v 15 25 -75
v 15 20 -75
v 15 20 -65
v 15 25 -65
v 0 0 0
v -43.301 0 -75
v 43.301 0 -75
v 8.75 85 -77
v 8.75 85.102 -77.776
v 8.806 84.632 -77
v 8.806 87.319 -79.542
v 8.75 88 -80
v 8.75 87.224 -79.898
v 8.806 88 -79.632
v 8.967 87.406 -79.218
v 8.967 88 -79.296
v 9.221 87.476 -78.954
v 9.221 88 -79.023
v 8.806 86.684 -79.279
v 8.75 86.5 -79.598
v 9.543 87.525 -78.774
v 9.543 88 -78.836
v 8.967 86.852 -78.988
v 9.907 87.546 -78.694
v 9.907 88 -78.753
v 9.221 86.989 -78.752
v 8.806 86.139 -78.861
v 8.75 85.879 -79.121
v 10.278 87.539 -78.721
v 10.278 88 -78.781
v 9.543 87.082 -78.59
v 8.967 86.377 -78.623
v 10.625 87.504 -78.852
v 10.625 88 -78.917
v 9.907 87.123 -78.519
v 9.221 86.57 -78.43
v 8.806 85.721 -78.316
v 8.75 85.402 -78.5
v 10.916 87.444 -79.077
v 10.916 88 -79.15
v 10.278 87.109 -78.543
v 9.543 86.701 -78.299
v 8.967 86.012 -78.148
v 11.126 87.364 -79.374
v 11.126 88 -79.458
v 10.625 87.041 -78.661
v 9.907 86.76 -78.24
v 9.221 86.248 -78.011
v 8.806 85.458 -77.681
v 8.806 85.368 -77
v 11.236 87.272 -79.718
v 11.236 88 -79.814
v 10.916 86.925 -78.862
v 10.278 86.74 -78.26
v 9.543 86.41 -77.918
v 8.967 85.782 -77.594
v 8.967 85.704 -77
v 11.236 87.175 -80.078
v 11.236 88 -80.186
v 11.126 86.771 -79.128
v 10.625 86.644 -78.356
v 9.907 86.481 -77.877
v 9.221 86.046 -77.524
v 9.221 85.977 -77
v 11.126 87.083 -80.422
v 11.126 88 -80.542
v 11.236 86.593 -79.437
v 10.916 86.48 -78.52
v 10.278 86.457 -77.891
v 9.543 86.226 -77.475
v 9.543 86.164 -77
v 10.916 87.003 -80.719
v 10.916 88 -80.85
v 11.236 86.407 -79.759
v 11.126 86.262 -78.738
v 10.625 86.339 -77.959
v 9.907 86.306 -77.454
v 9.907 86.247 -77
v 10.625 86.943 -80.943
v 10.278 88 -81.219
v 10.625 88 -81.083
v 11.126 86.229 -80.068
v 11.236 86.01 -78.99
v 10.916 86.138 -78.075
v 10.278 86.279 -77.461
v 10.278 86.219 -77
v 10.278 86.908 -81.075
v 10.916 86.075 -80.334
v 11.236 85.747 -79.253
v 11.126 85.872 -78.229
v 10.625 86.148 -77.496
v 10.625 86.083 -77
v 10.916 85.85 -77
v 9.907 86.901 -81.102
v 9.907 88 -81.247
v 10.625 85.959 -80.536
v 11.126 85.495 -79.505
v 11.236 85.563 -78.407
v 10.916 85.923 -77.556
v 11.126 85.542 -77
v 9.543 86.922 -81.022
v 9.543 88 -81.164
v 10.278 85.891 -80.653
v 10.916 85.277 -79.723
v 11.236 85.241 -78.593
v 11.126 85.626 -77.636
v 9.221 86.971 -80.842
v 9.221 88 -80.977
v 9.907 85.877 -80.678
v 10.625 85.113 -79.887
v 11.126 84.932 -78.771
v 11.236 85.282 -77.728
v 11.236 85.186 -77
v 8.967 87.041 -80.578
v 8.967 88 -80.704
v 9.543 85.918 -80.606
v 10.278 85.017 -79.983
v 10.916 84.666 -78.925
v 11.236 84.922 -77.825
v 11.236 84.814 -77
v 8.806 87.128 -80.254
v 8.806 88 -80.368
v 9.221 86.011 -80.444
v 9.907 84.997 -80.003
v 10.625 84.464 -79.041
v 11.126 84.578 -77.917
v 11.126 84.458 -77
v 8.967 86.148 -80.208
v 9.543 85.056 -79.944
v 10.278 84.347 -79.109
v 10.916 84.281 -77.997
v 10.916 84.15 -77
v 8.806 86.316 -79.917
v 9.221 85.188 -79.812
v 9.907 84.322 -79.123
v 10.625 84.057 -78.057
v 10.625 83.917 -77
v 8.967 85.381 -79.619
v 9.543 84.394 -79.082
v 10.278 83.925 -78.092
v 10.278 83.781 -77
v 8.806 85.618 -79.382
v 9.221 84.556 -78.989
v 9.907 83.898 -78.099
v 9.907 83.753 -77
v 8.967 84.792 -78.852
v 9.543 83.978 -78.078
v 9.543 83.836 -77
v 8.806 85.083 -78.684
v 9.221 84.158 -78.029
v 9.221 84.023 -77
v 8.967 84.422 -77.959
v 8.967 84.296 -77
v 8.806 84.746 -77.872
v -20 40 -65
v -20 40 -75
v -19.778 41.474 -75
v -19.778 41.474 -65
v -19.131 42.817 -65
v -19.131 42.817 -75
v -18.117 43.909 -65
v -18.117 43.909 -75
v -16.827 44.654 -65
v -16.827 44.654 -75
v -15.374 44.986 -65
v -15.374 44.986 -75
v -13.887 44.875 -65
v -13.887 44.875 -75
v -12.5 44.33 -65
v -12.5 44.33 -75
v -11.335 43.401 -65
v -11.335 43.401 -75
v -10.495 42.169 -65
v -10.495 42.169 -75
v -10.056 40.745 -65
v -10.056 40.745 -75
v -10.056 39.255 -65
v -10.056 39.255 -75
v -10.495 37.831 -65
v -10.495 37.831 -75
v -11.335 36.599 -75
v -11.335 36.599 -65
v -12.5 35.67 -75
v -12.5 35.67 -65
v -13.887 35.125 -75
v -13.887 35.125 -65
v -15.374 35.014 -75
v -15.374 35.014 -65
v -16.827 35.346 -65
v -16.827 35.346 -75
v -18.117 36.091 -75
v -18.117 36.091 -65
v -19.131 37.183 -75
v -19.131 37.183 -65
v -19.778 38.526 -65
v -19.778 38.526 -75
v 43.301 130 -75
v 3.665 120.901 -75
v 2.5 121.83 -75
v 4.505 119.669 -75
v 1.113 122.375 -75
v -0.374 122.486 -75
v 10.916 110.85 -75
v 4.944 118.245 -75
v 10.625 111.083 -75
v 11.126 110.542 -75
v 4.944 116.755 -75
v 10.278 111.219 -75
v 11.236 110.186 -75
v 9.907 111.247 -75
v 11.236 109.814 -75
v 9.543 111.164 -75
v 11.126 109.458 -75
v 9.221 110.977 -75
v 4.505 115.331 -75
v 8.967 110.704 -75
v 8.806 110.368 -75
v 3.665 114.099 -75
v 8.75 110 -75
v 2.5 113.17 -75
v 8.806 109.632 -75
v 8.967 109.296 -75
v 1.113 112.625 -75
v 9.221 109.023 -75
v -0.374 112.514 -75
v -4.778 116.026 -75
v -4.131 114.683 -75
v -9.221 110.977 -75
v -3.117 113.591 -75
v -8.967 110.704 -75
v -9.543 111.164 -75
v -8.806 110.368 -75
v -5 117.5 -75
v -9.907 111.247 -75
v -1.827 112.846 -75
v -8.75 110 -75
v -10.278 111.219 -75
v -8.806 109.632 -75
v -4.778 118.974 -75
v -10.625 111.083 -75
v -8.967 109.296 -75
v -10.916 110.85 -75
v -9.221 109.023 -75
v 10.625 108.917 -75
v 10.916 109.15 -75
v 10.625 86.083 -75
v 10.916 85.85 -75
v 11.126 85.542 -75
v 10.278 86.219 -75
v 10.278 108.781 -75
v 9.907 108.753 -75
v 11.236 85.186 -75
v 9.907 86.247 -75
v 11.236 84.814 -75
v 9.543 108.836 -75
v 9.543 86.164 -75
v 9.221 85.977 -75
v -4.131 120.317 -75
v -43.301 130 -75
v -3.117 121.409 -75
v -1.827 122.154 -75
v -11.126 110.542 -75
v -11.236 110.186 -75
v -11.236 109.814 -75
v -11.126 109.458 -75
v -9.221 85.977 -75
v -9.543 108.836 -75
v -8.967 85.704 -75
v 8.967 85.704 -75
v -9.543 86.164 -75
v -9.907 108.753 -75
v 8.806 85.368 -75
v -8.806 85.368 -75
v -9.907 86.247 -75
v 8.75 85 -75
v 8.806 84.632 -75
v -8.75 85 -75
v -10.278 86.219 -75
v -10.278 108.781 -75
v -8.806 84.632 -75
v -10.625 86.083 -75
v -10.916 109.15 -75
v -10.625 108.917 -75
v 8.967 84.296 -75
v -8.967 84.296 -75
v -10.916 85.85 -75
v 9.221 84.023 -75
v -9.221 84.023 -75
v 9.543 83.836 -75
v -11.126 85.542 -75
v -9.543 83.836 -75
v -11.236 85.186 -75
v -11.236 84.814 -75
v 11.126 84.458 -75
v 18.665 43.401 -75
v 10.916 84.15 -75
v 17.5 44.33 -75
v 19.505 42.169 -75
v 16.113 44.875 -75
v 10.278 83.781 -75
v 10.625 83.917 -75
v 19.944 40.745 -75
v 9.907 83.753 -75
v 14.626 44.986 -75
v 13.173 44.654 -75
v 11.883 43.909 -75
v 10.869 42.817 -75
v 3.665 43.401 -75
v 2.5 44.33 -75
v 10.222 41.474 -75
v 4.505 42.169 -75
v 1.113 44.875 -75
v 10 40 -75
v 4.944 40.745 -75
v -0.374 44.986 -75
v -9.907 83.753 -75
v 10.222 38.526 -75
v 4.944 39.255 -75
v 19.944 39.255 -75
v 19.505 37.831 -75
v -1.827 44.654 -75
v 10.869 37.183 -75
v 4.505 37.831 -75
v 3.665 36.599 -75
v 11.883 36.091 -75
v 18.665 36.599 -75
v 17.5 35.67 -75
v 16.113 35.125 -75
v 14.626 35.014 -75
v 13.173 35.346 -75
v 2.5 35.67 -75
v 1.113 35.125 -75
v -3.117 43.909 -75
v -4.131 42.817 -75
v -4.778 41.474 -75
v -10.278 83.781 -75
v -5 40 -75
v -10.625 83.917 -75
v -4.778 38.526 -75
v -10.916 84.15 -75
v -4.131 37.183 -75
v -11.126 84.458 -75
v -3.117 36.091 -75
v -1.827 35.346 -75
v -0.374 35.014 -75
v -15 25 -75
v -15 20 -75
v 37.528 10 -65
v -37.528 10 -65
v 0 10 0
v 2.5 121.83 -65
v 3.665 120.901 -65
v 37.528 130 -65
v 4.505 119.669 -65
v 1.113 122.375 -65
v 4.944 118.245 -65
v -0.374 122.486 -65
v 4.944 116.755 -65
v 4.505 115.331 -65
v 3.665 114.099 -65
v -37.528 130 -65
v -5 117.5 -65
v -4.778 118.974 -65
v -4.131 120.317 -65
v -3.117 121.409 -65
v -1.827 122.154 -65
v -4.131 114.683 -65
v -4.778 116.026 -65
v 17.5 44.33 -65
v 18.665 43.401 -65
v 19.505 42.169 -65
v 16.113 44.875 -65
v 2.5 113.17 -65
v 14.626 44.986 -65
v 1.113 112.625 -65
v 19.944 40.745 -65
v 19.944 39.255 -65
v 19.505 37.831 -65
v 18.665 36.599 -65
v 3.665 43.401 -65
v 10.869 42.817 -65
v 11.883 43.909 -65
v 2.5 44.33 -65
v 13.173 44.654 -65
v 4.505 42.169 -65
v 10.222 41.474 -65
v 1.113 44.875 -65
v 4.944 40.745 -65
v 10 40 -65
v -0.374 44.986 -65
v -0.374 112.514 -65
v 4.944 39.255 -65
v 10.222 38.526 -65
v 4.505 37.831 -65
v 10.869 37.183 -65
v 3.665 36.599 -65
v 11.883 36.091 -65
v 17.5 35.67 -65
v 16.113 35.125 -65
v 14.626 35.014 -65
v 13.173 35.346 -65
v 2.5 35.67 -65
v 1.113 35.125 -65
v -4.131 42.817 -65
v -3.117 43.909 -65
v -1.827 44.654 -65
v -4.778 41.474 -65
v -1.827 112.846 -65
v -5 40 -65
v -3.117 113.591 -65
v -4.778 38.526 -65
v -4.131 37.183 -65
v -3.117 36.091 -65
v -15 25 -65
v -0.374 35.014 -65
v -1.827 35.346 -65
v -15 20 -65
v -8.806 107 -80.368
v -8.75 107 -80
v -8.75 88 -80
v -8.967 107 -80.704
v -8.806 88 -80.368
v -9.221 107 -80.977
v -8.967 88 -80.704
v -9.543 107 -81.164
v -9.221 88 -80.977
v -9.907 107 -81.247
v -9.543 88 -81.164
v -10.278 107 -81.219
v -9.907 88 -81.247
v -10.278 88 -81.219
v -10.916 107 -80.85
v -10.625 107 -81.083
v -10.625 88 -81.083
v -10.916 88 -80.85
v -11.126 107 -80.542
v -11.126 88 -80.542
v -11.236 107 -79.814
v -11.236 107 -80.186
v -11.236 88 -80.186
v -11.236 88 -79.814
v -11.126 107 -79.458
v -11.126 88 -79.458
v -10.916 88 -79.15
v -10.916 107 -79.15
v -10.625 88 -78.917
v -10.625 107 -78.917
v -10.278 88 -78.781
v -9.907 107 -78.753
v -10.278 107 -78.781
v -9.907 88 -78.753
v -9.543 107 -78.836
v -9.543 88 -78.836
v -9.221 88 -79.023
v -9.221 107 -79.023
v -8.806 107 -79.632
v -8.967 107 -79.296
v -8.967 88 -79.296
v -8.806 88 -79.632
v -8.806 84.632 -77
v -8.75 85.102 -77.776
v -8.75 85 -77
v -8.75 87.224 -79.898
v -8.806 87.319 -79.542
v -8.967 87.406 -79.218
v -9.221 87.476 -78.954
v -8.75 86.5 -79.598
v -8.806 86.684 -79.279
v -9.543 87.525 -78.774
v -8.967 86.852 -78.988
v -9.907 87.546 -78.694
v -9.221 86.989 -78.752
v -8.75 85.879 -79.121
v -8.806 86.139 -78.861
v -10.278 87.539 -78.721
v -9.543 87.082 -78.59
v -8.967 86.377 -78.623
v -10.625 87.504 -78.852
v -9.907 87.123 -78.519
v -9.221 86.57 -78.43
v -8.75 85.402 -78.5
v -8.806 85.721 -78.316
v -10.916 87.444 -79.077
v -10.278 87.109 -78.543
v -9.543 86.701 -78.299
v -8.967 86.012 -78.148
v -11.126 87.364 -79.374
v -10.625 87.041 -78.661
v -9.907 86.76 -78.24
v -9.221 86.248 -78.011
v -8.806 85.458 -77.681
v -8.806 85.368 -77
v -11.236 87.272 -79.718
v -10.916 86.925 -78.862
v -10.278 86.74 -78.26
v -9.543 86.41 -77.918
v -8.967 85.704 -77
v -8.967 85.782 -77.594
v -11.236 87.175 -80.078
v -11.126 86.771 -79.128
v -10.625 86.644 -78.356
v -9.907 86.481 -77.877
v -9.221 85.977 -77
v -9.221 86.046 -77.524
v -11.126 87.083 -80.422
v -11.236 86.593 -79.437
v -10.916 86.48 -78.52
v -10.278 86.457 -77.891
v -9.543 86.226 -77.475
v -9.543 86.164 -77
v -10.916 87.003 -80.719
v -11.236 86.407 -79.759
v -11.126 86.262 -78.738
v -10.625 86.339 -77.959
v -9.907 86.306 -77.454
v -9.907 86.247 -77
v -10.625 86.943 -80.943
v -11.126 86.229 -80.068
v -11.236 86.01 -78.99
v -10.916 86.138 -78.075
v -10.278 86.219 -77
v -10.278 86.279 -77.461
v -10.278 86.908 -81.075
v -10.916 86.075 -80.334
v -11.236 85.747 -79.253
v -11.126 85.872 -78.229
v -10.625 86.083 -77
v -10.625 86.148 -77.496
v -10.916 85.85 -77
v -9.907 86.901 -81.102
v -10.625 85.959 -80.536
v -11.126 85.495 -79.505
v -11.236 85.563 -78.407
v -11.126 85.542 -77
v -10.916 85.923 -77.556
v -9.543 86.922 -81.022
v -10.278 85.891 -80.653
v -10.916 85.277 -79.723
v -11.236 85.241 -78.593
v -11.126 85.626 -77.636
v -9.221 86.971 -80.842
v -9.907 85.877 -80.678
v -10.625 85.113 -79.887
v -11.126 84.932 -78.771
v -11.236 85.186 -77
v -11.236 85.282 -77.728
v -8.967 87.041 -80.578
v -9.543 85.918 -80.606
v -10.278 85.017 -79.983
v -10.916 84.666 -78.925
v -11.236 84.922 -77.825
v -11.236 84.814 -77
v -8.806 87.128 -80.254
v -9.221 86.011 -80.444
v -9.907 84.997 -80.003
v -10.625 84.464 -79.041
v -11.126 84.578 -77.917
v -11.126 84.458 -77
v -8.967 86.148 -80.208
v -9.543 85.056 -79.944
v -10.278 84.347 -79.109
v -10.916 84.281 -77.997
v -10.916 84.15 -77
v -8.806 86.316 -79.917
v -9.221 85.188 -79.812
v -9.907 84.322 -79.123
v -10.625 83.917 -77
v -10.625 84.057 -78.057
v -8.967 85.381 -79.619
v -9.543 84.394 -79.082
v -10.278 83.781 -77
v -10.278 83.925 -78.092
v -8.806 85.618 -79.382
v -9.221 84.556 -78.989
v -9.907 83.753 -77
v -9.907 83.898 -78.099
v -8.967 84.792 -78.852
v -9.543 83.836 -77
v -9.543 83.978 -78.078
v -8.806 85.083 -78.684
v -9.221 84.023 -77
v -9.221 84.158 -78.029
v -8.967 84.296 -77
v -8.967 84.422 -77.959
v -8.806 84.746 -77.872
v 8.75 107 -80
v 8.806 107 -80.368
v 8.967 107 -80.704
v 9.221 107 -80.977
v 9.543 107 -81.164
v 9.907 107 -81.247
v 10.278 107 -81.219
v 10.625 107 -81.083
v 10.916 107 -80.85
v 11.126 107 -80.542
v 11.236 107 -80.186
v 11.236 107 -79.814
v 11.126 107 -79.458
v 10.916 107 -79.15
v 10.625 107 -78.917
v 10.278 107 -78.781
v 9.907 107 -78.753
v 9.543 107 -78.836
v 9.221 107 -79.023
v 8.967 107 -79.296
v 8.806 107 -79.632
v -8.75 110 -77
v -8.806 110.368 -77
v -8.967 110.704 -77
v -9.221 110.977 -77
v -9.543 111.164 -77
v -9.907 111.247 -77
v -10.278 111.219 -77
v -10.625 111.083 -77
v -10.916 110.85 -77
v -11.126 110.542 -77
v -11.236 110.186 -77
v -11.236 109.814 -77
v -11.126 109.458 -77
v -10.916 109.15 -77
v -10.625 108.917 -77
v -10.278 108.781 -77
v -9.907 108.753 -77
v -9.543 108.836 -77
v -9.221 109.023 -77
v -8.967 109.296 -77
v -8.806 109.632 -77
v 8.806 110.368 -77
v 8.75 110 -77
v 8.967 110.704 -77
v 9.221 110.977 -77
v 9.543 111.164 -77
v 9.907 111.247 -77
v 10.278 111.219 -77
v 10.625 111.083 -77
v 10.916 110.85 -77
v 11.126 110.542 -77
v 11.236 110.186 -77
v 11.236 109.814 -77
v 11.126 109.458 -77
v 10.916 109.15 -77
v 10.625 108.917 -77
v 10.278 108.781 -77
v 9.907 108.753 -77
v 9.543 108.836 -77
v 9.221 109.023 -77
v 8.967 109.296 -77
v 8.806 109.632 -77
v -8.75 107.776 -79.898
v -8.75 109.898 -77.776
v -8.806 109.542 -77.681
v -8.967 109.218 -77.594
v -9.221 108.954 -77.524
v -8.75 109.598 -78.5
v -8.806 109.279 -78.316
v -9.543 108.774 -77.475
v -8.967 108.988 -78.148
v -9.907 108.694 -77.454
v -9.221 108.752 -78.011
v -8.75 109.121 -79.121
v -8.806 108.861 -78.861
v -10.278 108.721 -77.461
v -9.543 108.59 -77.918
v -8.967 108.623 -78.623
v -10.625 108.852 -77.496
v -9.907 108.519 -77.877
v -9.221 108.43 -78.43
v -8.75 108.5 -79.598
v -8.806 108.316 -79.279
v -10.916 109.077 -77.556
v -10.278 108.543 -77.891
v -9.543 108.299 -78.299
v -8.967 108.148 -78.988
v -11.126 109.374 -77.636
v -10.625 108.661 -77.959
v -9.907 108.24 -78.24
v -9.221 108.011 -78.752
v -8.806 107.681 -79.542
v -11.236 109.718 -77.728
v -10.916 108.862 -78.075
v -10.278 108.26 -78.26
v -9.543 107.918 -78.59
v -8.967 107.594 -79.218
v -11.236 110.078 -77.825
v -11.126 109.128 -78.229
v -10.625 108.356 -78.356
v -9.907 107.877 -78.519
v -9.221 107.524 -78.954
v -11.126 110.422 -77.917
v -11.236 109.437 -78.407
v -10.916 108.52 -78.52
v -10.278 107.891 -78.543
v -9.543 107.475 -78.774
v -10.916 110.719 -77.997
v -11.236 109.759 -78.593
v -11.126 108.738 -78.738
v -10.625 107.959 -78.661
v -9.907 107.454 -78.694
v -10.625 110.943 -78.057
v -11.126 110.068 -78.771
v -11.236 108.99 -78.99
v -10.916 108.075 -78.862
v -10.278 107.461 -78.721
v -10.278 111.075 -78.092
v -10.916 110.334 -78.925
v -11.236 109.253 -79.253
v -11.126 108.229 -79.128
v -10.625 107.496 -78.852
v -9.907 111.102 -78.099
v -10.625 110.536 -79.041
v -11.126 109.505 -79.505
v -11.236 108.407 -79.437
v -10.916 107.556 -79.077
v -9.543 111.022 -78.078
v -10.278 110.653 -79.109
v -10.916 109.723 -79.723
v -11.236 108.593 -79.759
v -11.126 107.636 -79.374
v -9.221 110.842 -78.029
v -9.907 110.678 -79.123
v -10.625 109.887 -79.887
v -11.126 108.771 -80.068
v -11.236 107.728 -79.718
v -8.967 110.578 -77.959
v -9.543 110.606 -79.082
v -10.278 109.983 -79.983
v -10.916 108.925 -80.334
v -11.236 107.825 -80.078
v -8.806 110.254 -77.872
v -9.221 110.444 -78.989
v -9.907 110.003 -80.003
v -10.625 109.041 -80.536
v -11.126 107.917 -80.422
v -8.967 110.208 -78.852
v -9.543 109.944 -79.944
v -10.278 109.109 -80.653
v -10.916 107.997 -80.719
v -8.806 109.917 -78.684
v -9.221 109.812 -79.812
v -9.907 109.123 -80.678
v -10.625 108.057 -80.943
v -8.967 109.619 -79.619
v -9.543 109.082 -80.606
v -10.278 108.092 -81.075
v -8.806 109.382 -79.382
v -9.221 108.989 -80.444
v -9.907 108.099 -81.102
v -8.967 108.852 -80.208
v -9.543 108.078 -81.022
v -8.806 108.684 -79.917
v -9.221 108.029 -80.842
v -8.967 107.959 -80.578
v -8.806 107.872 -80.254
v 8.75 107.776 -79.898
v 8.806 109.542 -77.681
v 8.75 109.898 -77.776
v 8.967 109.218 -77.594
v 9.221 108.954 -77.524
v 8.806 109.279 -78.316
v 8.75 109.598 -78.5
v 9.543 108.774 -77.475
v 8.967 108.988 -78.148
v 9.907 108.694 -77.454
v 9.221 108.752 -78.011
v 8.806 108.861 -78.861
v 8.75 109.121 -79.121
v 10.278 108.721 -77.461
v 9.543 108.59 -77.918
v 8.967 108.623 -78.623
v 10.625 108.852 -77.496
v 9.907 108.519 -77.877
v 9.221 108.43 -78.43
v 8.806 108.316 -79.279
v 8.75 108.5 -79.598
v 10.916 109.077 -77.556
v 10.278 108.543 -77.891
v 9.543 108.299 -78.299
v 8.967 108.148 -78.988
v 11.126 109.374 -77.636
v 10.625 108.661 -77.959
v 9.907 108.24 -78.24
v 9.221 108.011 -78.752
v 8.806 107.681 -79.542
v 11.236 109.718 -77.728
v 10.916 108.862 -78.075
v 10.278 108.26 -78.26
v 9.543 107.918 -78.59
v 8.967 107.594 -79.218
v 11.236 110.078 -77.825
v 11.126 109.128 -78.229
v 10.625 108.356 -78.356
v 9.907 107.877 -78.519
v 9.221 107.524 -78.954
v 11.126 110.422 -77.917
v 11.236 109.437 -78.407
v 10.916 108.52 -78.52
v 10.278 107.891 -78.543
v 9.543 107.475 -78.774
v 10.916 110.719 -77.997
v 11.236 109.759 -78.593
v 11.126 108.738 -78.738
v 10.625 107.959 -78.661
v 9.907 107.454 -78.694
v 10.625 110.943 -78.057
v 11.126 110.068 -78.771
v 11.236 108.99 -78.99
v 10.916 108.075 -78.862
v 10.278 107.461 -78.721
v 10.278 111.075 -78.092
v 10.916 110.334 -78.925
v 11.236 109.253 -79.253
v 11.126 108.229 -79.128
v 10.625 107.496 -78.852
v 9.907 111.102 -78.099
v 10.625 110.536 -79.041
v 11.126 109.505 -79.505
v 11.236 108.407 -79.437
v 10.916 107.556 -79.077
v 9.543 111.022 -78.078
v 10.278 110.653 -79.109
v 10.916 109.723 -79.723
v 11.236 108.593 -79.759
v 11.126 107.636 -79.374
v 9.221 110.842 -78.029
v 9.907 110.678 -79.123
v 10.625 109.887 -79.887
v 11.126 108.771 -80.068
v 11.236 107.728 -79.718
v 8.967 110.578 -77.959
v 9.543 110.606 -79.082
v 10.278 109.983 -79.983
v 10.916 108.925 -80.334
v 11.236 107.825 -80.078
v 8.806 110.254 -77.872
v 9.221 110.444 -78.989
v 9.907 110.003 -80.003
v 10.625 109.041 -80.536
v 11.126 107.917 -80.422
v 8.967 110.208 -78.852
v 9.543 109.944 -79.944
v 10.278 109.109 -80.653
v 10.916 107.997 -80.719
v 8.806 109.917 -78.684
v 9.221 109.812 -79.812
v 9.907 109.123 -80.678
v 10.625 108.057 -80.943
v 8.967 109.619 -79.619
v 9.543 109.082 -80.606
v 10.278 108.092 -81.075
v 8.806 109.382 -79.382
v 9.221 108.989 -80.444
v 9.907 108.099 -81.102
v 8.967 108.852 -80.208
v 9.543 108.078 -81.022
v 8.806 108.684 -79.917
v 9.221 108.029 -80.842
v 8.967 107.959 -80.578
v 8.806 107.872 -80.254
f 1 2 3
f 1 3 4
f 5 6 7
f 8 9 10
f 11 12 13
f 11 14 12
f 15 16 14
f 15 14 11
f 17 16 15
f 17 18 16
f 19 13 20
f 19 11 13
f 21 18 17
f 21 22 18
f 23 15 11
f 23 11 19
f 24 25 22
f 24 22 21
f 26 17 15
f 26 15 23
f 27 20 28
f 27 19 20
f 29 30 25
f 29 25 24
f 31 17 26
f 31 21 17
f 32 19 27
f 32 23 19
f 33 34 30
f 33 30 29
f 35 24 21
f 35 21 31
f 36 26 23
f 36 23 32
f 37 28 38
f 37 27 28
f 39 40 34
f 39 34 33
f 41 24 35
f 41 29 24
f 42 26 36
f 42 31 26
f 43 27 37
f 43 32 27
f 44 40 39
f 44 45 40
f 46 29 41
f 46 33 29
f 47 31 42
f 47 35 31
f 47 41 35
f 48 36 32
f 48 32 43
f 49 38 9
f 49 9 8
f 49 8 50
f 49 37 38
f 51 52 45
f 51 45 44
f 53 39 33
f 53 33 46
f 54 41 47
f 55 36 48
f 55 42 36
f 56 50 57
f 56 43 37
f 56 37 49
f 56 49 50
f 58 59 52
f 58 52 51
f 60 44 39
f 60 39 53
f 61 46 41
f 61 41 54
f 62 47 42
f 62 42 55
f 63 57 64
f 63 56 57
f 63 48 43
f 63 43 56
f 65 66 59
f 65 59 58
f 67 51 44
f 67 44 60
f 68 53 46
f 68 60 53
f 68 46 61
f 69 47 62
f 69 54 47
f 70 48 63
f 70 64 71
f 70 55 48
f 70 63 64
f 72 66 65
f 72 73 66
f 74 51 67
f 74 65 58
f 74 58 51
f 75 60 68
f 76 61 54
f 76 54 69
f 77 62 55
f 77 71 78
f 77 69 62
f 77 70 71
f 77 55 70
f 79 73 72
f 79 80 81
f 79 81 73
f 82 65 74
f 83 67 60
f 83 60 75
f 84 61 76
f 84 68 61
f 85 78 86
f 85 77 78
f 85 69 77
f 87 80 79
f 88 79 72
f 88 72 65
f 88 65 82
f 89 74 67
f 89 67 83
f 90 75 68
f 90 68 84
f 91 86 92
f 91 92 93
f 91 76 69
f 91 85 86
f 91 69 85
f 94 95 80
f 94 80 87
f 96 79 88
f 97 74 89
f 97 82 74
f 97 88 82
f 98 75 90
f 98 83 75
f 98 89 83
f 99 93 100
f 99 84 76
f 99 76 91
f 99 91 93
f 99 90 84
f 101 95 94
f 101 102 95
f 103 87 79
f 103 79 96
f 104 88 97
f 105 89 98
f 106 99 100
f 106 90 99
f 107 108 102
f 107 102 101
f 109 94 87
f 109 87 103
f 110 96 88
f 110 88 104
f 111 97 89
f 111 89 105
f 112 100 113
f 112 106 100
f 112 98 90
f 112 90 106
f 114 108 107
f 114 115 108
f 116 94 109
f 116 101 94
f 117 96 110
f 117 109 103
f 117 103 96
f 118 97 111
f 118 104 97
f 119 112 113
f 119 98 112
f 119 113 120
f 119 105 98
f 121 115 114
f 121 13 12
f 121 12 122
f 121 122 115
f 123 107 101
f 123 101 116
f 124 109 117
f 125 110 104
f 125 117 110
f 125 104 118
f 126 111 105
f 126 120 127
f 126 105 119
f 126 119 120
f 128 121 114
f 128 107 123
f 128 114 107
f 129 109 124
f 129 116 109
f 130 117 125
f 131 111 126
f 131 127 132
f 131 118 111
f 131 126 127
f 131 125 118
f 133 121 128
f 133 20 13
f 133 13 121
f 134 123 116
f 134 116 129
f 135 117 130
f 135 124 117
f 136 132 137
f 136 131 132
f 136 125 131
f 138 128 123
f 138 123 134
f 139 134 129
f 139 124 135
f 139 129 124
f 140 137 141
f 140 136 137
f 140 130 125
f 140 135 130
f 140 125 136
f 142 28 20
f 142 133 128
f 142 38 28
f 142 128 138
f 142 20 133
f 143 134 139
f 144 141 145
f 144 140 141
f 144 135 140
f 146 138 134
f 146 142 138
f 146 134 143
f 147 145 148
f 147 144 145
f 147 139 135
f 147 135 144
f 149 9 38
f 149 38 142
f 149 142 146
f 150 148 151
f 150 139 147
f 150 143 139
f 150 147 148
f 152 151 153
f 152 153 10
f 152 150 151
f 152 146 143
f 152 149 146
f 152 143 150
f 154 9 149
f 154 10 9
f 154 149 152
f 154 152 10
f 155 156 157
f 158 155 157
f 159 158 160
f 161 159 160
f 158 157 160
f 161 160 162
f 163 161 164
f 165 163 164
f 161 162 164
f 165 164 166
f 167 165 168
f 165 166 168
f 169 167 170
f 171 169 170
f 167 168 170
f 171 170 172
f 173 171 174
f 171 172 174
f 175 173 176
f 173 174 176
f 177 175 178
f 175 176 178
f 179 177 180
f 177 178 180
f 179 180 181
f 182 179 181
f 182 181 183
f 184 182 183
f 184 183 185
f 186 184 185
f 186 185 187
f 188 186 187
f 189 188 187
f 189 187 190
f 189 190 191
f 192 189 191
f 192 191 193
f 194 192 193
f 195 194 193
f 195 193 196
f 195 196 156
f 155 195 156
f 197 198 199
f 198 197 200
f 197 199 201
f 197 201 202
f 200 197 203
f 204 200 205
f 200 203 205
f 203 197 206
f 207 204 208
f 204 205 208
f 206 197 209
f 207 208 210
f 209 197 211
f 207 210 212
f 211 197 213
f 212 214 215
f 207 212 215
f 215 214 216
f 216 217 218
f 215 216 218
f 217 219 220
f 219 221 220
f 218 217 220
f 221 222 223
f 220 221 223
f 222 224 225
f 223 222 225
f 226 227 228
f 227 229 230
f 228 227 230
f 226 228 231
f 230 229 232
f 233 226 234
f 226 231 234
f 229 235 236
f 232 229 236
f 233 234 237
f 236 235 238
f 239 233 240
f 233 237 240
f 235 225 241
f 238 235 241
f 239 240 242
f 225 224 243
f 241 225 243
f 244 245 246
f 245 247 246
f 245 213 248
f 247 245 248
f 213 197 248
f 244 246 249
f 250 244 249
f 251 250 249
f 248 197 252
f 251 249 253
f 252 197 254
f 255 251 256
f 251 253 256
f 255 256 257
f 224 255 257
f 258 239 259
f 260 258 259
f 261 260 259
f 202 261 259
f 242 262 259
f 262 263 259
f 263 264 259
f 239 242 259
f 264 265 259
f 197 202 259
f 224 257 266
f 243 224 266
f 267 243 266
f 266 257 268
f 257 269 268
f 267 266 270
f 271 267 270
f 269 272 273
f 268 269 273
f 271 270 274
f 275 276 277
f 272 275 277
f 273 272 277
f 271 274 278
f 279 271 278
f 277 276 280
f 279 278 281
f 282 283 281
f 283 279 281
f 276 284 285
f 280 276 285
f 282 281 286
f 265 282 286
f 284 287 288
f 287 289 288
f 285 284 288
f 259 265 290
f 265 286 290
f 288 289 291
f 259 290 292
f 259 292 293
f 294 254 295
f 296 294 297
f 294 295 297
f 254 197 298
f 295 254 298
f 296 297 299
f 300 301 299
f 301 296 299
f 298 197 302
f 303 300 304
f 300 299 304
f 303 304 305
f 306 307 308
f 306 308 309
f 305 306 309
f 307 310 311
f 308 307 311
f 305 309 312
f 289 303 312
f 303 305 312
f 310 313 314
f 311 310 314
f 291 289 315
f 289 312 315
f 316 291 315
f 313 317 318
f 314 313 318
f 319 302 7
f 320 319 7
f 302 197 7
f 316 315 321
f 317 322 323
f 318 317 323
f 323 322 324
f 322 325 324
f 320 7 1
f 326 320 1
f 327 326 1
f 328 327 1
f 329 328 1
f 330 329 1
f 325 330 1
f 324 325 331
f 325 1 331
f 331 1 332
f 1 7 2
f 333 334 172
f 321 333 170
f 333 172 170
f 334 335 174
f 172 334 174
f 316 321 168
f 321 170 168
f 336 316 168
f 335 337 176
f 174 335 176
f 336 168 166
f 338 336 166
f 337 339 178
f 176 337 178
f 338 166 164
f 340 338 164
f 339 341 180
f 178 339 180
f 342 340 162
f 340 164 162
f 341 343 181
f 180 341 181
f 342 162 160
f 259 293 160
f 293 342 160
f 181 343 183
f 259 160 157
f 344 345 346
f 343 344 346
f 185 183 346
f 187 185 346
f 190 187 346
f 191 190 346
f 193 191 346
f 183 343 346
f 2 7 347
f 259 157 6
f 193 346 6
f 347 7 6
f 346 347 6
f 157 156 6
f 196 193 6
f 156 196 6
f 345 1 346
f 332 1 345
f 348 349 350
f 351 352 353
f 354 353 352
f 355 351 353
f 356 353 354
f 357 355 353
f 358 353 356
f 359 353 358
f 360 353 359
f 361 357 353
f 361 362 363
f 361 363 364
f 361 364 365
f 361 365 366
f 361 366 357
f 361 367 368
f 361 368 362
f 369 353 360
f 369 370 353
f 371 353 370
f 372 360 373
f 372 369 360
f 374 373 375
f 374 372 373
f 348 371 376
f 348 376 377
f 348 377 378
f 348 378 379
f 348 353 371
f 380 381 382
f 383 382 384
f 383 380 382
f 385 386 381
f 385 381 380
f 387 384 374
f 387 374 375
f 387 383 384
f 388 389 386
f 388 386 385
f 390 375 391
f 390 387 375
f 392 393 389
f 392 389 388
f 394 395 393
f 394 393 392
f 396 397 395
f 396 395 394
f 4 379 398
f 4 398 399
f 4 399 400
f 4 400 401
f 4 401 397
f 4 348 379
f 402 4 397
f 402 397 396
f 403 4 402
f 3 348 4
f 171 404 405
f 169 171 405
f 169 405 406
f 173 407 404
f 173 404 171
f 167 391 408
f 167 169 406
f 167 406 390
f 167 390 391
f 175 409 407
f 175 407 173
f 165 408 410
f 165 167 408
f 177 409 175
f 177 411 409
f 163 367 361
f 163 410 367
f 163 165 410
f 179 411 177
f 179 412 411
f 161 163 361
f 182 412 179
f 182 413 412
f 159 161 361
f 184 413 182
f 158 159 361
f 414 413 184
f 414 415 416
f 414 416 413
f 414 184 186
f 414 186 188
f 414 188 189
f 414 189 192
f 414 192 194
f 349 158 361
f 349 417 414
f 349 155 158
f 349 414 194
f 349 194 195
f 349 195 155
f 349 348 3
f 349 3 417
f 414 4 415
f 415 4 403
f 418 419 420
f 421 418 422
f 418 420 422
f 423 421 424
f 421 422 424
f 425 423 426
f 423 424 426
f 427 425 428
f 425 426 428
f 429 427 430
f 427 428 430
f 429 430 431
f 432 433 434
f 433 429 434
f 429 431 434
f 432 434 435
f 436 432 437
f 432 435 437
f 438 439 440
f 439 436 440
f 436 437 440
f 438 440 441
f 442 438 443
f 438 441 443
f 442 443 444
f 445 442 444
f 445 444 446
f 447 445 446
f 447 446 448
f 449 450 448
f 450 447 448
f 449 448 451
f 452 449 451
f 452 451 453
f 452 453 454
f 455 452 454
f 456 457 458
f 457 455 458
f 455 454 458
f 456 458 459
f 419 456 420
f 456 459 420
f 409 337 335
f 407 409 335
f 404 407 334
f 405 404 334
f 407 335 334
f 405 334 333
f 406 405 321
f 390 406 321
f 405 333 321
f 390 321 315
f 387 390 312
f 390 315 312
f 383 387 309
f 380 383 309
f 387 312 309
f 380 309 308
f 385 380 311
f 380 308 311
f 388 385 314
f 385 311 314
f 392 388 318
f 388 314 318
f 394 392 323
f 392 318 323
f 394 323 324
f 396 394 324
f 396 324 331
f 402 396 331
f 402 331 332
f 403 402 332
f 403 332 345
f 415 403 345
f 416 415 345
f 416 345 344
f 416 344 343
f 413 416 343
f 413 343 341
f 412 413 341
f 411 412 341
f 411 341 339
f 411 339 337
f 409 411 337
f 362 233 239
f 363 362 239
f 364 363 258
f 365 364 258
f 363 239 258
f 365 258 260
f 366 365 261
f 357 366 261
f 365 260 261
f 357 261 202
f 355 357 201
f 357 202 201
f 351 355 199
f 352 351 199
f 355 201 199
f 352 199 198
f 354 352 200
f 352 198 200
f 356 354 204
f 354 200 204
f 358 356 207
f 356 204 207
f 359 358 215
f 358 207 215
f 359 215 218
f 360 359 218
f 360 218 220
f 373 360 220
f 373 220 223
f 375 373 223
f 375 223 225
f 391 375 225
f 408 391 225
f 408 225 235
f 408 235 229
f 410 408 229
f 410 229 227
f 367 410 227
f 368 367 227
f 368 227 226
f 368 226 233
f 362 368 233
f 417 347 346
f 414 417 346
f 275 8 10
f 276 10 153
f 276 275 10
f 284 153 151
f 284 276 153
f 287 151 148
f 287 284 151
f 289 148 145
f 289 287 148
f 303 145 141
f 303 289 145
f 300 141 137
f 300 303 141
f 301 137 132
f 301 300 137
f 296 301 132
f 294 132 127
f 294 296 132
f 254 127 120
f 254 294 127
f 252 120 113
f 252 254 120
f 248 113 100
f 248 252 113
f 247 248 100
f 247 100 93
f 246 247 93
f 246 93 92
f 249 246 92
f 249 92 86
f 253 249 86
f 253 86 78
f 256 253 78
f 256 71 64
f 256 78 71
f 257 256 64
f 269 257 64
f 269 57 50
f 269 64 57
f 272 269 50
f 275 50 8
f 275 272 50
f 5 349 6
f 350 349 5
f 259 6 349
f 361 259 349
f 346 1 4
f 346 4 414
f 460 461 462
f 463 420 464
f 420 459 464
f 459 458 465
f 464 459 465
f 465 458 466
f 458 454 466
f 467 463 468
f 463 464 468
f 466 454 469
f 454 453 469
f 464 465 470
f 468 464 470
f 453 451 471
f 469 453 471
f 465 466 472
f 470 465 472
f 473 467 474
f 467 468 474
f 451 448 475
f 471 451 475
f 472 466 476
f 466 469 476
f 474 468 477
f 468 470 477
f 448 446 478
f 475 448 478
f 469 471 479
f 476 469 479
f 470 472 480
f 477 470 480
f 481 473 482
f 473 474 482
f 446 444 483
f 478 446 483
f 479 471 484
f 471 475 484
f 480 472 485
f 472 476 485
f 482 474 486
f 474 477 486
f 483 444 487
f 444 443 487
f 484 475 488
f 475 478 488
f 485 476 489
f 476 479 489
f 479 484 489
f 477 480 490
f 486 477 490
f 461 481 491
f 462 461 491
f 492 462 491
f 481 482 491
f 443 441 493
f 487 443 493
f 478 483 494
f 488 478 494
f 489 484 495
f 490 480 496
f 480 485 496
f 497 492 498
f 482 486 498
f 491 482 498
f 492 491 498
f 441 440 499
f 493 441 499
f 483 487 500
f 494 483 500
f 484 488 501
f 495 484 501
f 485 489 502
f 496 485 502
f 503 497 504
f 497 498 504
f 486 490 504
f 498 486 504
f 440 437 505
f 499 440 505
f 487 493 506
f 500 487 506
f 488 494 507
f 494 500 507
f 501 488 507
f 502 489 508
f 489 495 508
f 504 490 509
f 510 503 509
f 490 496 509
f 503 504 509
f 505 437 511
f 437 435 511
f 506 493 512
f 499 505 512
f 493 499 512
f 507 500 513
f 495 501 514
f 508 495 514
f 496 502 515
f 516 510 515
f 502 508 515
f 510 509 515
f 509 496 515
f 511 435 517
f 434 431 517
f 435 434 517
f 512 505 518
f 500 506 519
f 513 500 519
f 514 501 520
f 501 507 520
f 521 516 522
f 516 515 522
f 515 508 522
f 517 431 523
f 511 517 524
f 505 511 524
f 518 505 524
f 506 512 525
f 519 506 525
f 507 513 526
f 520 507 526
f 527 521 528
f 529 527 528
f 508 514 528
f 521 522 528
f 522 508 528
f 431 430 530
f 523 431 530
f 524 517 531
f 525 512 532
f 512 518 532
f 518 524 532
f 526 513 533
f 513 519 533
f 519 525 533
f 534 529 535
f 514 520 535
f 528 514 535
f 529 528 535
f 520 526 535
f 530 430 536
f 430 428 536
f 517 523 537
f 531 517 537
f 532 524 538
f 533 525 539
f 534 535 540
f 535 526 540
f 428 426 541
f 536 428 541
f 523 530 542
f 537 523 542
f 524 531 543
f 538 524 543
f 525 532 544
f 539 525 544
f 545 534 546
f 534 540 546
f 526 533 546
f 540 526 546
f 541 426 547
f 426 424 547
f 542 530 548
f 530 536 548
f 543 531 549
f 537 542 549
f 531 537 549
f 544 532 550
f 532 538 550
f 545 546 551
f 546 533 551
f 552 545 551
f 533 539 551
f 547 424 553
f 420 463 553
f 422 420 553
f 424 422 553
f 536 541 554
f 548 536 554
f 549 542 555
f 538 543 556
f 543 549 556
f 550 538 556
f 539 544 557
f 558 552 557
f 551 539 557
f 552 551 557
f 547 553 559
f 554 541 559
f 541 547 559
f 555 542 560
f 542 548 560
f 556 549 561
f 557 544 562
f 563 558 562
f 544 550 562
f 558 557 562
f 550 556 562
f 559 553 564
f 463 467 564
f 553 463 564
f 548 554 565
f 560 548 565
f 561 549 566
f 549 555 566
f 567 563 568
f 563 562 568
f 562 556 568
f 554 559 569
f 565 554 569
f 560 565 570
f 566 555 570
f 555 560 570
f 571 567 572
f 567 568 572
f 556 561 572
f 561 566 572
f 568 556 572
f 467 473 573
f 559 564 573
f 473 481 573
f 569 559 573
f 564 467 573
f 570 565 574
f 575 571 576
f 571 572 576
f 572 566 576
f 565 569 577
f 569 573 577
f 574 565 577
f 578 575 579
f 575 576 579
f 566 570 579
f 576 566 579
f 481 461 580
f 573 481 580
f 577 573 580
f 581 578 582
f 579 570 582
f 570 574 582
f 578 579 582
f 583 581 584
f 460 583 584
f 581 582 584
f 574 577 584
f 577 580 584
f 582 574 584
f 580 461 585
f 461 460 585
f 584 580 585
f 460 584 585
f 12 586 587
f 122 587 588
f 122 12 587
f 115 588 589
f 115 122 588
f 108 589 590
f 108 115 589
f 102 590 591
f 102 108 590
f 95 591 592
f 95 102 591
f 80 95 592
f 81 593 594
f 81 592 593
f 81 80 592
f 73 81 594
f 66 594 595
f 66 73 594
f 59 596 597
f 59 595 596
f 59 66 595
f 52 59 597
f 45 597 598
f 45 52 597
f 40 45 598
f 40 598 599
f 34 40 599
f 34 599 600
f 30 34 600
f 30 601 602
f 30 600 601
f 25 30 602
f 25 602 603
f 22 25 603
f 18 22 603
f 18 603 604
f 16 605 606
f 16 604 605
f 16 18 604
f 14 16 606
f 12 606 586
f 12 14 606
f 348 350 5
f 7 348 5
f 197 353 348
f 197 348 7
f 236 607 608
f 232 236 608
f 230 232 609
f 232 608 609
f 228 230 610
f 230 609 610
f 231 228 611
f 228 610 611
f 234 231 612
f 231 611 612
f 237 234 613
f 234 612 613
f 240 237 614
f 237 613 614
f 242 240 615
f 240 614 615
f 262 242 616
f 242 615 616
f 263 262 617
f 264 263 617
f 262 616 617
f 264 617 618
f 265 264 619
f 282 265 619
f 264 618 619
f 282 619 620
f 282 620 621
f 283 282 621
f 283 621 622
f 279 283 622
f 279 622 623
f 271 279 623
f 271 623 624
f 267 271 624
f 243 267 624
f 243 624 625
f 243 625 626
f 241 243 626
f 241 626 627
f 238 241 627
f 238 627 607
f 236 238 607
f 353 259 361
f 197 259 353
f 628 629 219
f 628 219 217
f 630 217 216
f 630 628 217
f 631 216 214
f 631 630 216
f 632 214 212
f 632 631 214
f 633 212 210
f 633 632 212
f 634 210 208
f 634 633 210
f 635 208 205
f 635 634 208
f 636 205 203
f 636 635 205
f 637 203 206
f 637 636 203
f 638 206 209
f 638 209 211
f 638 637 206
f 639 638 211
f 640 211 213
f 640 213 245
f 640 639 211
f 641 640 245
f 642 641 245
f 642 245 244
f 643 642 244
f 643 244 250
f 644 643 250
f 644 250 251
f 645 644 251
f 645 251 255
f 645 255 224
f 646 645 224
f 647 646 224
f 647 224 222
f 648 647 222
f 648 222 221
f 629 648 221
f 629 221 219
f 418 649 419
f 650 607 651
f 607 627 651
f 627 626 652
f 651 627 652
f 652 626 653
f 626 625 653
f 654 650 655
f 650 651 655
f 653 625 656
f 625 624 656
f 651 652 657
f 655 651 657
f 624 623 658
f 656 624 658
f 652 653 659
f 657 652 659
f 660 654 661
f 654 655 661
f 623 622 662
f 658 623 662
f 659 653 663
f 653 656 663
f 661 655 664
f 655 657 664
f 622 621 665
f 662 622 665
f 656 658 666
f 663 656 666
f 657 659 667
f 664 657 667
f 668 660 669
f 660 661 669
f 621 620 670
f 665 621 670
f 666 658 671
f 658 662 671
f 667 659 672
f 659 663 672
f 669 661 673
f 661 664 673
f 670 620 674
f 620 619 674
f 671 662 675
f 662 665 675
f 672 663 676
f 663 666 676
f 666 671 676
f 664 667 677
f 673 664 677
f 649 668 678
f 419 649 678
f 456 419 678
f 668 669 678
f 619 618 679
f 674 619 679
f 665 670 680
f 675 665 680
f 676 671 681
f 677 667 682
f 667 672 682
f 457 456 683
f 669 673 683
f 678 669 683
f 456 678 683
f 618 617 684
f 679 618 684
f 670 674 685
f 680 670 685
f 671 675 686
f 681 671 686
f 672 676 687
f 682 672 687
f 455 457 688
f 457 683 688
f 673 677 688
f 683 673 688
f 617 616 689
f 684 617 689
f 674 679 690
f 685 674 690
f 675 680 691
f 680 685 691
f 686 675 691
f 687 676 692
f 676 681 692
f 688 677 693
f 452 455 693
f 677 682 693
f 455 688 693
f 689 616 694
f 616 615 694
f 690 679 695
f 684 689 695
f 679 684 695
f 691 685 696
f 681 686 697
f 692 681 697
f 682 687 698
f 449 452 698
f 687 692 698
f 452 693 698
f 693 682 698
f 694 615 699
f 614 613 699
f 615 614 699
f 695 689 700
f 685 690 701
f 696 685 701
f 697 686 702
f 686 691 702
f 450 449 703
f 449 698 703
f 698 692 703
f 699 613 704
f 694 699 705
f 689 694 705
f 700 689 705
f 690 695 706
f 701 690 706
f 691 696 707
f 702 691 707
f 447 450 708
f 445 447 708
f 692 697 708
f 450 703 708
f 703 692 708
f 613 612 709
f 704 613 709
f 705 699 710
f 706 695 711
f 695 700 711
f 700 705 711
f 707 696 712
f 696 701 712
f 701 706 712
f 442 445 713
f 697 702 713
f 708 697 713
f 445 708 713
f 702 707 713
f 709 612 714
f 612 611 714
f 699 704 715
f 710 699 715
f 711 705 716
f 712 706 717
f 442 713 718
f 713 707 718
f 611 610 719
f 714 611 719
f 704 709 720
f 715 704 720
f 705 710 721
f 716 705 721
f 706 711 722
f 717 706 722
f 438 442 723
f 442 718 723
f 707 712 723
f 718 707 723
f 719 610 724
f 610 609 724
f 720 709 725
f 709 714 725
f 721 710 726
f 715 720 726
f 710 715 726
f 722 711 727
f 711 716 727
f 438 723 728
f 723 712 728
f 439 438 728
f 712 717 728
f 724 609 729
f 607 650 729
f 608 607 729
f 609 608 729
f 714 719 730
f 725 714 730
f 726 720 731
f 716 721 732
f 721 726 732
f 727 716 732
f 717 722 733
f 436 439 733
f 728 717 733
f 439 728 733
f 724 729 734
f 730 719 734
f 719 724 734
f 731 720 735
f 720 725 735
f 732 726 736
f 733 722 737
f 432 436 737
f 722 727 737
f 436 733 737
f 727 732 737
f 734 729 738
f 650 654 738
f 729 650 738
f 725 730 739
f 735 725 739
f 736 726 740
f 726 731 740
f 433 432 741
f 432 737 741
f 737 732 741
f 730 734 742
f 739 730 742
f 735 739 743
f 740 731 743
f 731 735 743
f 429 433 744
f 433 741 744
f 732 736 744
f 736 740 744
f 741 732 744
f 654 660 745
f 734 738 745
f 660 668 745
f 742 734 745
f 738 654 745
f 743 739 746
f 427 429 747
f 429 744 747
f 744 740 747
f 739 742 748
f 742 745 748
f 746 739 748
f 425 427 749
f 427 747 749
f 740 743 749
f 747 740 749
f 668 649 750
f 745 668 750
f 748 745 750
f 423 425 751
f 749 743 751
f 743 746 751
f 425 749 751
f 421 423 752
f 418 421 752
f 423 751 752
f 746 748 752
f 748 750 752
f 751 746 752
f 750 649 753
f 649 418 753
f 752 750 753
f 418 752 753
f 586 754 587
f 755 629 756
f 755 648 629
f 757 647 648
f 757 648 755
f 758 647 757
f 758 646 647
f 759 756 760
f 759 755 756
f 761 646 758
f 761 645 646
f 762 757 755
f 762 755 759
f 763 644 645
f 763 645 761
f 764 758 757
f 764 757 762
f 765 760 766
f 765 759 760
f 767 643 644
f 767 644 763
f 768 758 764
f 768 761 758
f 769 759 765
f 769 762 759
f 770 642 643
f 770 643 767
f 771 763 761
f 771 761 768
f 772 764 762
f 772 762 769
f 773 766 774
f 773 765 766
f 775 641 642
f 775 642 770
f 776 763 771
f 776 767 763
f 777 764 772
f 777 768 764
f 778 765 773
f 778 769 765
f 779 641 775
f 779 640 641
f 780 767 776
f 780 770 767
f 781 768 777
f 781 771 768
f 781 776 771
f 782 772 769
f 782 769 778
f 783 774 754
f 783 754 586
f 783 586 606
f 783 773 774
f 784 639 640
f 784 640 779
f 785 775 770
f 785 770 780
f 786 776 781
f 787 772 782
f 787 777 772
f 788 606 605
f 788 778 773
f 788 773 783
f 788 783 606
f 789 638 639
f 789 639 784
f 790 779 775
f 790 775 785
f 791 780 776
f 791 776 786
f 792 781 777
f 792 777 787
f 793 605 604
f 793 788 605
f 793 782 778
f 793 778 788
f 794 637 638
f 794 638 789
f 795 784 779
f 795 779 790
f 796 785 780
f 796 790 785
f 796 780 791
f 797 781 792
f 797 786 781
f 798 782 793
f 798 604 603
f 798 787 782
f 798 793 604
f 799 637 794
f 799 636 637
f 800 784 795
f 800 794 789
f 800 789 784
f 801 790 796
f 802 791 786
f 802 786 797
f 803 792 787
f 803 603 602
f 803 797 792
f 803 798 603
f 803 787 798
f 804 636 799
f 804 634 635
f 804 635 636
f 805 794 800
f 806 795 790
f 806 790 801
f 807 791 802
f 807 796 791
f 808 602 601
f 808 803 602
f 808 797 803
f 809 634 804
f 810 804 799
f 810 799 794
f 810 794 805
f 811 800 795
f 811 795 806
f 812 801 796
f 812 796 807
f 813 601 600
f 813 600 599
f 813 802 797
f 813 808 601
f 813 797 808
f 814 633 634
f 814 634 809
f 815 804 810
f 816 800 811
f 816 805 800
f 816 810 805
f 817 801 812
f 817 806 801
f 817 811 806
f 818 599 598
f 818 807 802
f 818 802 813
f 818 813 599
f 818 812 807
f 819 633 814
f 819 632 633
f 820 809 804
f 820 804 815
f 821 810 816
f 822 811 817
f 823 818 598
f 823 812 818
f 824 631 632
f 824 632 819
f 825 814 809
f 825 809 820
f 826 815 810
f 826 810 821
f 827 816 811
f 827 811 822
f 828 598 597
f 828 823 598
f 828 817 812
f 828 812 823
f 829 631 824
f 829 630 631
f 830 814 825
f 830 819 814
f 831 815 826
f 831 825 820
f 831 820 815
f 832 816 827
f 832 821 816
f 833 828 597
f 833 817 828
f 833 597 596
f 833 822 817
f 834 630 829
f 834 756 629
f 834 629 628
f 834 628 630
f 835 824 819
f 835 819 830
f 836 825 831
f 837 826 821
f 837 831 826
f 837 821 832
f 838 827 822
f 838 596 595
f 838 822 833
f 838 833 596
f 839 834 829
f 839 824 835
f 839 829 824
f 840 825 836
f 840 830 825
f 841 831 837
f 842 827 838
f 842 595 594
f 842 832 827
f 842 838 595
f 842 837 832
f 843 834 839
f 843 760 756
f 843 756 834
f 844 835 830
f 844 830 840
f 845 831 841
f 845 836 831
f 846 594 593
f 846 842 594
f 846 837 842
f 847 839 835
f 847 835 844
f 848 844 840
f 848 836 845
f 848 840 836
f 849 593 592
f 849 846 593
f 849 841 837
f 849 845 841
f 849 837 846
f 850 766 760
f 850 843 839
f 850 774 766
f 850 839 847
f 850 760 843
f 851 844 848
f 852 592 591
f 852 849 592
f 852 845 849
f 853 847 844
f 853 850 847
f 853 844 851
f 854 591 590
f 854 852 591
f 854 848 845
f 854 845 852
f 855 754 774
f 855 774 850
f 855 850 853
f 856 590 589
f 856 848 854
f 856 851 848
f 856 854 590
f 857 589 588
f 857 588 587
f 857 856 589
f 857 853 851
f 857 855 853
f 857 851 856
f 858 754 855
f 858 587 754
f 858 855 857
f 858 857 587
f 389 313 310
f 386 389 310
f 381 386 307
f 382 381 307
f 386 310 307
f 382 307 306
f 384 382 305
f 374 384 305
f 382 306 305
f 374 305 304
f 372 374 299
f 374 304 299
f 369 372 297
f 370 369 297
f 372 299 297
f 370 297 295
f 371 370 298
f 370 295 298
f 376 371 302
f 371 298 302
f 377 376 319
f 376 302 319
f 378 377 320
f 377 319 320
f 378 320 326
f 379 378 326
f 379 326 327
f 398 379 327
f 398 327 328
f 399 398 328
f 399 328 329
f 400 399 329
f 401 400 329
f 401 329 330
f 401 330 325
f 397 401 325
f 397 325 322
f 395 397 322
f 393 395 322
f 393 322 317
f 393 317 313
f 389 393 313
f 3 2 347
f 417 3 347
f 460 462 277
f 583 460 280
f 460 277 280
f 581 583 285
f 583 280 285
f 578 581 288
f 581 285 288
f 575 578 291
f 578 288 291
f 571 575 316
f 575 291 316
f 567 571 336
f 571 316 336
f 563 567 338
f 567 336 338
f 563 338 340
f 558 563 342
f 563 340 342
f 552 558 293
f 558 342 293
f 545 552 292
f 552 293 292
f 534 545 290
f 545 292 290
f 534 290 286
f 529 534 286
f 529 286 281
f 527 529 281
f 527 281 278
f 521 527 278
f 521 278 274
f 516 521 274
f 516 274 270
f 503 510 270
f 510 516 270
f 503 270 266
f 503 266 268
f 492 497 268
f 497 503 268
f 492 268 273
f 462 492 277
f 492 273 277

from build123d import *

# Parameters (mm, degrees)
MAIN_FRAME_DEPTH     = 130
SHELL1_T             = -10
CUT_EXTRUDE1_DEPTH   = 174.277234512
EXTERNAL_PORTS_REACH = 158.205
SKETCH5_R            = 5
SKETCH5_W            = 30
SKETCH5_H            = 5
SKETCH7_R            = 1.25


with BuildPart() as part:
    # Sketch1 → Main Frame (new body)
    with BuildSketch(Plane(origin=(0, 0, 0), x_dir=(1, 0, 0), z_dir=(0, 1, 0))):
        Polygon((86.602540378, 0), (43.301270189, 75), (-43.301270189, 75), (-86.602540378, 0), (-43.301270189, -75), (43.301270189, -75), align=None)
    extrude(amount=MAIN_FRAME_DEPTH)

    # Shell1
    shell1_openings = [part.faces().sort_by_distance(p)[0] for p in [
        (0, 130, 0),
    ]]
    offset(amount=SHELL1_T, openings=shell1_openings, kind=Kind.INTERSECTION)

    # Sketch2 → Cut-Extrude1 (cut, through all)
    with BuildSketch(Plane(origin=(0, 130, 0), x_dir=(1, 0, 0), z_dir=(0, 1, 0))):
        Polygon((-43.301270189, 75), (0, 0), (43.301270189, 75), (86.602540378, 0), (43.301270189, -75), (-43.301270189, -75), (-86.602540378, 0), align=None)
    extrude(amount=-CUT_EXTRUDE1_DEPTH, mode=Mode.SUBTRACT)

    # Sketch5 → External Ports (cut, up to next)
    with BuildSketch(Plane(origin=(0, 0, -75), x_dir=(-1, 0, 0), z_dir=(0, 0, -1)), mode=Mode.PRIVATE) as external_ports_sk1:
        with Locations((-15, 40)):
            Circle(SKETCH5_R)
    external_ports_tool1 = extrude(external_ports_sk1.sketch, amount=-EXTERNAL_PORTS_REACH, mode=Mode.PRIVATE) & part.part
    # Sketch5 → External Ports (cut, up to next)
    with BuildSketch(Plane(origin=(0, 0, -75), x_dir=(-1, 0, 0), z_dir=(0, 0, -1)), mode=Mode.PRIVATE) as external_ports_sk2:
        with Locations((0, 40)):
            Circle(SKETCH5_R)
    external_ports_tool2 = extrude(external_ports_sk2.sketch, amount=-EXTERNAL_PORTS_REACH, mode=Mode.PRIVATE) & part.part
    # Sketch5 → External Ports (cut, up to next)
    with BuildSketch(Plane(origin=(0, 0, -75), x_dir=(-1, 0, 0), z_dir=(0, 0, -1)), mode=Mode.PRIVATE) as external_ports_sk3:
        with Locations((15, 40)):
            Circle(SKETCH5_R)
    external_ports_tool3 = extrude(external_ports_sk3.sketch, amount=-EXTERNAL_PORTS_REACH, mode=Mode.PRIVATE) & part.part
    # Sketch5 → External Ports (cut, up to next)
    with BuildSketch(Plane(origin=(0, 0, -75), x_dir=(-1, 0, 0), z_dir=(0, 0, -1)), mode=Mode.PRIVATE) as external_ports_sk4:
        with Locations((0, 117.5)):
            Circle(SKETCH5_R)
    external_ports_tool4 = extrude(external_ports_sk4.sketch, amount=-EXTERNAL_PORTS_REACH, mode=Mode.PRIVATE) & part.part
    # Sketch5 → External Ports (cut, up to next)
    with BuildSketch(Plane(origin=(0, 0, -75), x_dir=(-1, 0, 0), z_dir=(0, 0, -1)), mode=Mode.PRIVATE) as external_ports_sk5:
        with Locations((0, 22.5)):
            Rectangle(SKETCH5_W, SKETCH5_H)
    external_ports_tool5 = extrude(external_ports_sk5.sketch, amount=-EXTERNAL_PORTS_REACH, mode=Mode.PRIVATE) & part.part
    add(external_ports_tool1.solids().sort_by_distance((15, 40, -75))[0], mode=Mode.SUBTRACT)
    add(external_ports_tool2.solids().sort_by_distance((0, 40, -75))[0], mode=Mode.SUBTRACT)
    add(external_ports_tool3.solids().sort_by_distance((-15, 40, -75))[0], mode=Mode.SUBTRACT)
    add(external_ports_tool4.solids().sort_by_distance((0, 117.5, -75))[0], mode=Mode.SUBTRACT)
    add(external_ports_tool5.solids().sort_by_distance((0, 22.5, -75))[0], mode=Mode.SUBTRACT)

    # Boom Mount: sweep along a path in Sketch6
    with BuildLine(Plane(origin=(10, 0, 0), x_dir=(0, 0, -1), z_dir=(1, 0, 0))) as boom_mount_path:
        Line((75, 110), (77, 110))
        ThreePointArc((77, 110), (79.121320344, 109.121320344), (80, 107))
        Line((80, 107), (80, 88))
        ThreePointArc((80, 88), (79.121320344, 85.878679656), (77, 85))
        Line((77, 85), (75, 85))
    # Sketch7 → Boom Mount (sweep)
    with BuildSketch(Plane(origin=(0, 0, -75), x_dir=(-1, 0, 0), z_dir=(0, 0, -1))):
        with Locations((-10, 110)):
            Circle(SKETCH7_R)
    boom_mount = sweep(path=boom_mount_path.line)

    # Mirror1: Boom Mount across plane
    add(boom_mount.mirror(Plane(origin=(0, 0, 0), x_dir=(0, 0, 1), z_dir=(1, 0, 0))))


solid = part.part
